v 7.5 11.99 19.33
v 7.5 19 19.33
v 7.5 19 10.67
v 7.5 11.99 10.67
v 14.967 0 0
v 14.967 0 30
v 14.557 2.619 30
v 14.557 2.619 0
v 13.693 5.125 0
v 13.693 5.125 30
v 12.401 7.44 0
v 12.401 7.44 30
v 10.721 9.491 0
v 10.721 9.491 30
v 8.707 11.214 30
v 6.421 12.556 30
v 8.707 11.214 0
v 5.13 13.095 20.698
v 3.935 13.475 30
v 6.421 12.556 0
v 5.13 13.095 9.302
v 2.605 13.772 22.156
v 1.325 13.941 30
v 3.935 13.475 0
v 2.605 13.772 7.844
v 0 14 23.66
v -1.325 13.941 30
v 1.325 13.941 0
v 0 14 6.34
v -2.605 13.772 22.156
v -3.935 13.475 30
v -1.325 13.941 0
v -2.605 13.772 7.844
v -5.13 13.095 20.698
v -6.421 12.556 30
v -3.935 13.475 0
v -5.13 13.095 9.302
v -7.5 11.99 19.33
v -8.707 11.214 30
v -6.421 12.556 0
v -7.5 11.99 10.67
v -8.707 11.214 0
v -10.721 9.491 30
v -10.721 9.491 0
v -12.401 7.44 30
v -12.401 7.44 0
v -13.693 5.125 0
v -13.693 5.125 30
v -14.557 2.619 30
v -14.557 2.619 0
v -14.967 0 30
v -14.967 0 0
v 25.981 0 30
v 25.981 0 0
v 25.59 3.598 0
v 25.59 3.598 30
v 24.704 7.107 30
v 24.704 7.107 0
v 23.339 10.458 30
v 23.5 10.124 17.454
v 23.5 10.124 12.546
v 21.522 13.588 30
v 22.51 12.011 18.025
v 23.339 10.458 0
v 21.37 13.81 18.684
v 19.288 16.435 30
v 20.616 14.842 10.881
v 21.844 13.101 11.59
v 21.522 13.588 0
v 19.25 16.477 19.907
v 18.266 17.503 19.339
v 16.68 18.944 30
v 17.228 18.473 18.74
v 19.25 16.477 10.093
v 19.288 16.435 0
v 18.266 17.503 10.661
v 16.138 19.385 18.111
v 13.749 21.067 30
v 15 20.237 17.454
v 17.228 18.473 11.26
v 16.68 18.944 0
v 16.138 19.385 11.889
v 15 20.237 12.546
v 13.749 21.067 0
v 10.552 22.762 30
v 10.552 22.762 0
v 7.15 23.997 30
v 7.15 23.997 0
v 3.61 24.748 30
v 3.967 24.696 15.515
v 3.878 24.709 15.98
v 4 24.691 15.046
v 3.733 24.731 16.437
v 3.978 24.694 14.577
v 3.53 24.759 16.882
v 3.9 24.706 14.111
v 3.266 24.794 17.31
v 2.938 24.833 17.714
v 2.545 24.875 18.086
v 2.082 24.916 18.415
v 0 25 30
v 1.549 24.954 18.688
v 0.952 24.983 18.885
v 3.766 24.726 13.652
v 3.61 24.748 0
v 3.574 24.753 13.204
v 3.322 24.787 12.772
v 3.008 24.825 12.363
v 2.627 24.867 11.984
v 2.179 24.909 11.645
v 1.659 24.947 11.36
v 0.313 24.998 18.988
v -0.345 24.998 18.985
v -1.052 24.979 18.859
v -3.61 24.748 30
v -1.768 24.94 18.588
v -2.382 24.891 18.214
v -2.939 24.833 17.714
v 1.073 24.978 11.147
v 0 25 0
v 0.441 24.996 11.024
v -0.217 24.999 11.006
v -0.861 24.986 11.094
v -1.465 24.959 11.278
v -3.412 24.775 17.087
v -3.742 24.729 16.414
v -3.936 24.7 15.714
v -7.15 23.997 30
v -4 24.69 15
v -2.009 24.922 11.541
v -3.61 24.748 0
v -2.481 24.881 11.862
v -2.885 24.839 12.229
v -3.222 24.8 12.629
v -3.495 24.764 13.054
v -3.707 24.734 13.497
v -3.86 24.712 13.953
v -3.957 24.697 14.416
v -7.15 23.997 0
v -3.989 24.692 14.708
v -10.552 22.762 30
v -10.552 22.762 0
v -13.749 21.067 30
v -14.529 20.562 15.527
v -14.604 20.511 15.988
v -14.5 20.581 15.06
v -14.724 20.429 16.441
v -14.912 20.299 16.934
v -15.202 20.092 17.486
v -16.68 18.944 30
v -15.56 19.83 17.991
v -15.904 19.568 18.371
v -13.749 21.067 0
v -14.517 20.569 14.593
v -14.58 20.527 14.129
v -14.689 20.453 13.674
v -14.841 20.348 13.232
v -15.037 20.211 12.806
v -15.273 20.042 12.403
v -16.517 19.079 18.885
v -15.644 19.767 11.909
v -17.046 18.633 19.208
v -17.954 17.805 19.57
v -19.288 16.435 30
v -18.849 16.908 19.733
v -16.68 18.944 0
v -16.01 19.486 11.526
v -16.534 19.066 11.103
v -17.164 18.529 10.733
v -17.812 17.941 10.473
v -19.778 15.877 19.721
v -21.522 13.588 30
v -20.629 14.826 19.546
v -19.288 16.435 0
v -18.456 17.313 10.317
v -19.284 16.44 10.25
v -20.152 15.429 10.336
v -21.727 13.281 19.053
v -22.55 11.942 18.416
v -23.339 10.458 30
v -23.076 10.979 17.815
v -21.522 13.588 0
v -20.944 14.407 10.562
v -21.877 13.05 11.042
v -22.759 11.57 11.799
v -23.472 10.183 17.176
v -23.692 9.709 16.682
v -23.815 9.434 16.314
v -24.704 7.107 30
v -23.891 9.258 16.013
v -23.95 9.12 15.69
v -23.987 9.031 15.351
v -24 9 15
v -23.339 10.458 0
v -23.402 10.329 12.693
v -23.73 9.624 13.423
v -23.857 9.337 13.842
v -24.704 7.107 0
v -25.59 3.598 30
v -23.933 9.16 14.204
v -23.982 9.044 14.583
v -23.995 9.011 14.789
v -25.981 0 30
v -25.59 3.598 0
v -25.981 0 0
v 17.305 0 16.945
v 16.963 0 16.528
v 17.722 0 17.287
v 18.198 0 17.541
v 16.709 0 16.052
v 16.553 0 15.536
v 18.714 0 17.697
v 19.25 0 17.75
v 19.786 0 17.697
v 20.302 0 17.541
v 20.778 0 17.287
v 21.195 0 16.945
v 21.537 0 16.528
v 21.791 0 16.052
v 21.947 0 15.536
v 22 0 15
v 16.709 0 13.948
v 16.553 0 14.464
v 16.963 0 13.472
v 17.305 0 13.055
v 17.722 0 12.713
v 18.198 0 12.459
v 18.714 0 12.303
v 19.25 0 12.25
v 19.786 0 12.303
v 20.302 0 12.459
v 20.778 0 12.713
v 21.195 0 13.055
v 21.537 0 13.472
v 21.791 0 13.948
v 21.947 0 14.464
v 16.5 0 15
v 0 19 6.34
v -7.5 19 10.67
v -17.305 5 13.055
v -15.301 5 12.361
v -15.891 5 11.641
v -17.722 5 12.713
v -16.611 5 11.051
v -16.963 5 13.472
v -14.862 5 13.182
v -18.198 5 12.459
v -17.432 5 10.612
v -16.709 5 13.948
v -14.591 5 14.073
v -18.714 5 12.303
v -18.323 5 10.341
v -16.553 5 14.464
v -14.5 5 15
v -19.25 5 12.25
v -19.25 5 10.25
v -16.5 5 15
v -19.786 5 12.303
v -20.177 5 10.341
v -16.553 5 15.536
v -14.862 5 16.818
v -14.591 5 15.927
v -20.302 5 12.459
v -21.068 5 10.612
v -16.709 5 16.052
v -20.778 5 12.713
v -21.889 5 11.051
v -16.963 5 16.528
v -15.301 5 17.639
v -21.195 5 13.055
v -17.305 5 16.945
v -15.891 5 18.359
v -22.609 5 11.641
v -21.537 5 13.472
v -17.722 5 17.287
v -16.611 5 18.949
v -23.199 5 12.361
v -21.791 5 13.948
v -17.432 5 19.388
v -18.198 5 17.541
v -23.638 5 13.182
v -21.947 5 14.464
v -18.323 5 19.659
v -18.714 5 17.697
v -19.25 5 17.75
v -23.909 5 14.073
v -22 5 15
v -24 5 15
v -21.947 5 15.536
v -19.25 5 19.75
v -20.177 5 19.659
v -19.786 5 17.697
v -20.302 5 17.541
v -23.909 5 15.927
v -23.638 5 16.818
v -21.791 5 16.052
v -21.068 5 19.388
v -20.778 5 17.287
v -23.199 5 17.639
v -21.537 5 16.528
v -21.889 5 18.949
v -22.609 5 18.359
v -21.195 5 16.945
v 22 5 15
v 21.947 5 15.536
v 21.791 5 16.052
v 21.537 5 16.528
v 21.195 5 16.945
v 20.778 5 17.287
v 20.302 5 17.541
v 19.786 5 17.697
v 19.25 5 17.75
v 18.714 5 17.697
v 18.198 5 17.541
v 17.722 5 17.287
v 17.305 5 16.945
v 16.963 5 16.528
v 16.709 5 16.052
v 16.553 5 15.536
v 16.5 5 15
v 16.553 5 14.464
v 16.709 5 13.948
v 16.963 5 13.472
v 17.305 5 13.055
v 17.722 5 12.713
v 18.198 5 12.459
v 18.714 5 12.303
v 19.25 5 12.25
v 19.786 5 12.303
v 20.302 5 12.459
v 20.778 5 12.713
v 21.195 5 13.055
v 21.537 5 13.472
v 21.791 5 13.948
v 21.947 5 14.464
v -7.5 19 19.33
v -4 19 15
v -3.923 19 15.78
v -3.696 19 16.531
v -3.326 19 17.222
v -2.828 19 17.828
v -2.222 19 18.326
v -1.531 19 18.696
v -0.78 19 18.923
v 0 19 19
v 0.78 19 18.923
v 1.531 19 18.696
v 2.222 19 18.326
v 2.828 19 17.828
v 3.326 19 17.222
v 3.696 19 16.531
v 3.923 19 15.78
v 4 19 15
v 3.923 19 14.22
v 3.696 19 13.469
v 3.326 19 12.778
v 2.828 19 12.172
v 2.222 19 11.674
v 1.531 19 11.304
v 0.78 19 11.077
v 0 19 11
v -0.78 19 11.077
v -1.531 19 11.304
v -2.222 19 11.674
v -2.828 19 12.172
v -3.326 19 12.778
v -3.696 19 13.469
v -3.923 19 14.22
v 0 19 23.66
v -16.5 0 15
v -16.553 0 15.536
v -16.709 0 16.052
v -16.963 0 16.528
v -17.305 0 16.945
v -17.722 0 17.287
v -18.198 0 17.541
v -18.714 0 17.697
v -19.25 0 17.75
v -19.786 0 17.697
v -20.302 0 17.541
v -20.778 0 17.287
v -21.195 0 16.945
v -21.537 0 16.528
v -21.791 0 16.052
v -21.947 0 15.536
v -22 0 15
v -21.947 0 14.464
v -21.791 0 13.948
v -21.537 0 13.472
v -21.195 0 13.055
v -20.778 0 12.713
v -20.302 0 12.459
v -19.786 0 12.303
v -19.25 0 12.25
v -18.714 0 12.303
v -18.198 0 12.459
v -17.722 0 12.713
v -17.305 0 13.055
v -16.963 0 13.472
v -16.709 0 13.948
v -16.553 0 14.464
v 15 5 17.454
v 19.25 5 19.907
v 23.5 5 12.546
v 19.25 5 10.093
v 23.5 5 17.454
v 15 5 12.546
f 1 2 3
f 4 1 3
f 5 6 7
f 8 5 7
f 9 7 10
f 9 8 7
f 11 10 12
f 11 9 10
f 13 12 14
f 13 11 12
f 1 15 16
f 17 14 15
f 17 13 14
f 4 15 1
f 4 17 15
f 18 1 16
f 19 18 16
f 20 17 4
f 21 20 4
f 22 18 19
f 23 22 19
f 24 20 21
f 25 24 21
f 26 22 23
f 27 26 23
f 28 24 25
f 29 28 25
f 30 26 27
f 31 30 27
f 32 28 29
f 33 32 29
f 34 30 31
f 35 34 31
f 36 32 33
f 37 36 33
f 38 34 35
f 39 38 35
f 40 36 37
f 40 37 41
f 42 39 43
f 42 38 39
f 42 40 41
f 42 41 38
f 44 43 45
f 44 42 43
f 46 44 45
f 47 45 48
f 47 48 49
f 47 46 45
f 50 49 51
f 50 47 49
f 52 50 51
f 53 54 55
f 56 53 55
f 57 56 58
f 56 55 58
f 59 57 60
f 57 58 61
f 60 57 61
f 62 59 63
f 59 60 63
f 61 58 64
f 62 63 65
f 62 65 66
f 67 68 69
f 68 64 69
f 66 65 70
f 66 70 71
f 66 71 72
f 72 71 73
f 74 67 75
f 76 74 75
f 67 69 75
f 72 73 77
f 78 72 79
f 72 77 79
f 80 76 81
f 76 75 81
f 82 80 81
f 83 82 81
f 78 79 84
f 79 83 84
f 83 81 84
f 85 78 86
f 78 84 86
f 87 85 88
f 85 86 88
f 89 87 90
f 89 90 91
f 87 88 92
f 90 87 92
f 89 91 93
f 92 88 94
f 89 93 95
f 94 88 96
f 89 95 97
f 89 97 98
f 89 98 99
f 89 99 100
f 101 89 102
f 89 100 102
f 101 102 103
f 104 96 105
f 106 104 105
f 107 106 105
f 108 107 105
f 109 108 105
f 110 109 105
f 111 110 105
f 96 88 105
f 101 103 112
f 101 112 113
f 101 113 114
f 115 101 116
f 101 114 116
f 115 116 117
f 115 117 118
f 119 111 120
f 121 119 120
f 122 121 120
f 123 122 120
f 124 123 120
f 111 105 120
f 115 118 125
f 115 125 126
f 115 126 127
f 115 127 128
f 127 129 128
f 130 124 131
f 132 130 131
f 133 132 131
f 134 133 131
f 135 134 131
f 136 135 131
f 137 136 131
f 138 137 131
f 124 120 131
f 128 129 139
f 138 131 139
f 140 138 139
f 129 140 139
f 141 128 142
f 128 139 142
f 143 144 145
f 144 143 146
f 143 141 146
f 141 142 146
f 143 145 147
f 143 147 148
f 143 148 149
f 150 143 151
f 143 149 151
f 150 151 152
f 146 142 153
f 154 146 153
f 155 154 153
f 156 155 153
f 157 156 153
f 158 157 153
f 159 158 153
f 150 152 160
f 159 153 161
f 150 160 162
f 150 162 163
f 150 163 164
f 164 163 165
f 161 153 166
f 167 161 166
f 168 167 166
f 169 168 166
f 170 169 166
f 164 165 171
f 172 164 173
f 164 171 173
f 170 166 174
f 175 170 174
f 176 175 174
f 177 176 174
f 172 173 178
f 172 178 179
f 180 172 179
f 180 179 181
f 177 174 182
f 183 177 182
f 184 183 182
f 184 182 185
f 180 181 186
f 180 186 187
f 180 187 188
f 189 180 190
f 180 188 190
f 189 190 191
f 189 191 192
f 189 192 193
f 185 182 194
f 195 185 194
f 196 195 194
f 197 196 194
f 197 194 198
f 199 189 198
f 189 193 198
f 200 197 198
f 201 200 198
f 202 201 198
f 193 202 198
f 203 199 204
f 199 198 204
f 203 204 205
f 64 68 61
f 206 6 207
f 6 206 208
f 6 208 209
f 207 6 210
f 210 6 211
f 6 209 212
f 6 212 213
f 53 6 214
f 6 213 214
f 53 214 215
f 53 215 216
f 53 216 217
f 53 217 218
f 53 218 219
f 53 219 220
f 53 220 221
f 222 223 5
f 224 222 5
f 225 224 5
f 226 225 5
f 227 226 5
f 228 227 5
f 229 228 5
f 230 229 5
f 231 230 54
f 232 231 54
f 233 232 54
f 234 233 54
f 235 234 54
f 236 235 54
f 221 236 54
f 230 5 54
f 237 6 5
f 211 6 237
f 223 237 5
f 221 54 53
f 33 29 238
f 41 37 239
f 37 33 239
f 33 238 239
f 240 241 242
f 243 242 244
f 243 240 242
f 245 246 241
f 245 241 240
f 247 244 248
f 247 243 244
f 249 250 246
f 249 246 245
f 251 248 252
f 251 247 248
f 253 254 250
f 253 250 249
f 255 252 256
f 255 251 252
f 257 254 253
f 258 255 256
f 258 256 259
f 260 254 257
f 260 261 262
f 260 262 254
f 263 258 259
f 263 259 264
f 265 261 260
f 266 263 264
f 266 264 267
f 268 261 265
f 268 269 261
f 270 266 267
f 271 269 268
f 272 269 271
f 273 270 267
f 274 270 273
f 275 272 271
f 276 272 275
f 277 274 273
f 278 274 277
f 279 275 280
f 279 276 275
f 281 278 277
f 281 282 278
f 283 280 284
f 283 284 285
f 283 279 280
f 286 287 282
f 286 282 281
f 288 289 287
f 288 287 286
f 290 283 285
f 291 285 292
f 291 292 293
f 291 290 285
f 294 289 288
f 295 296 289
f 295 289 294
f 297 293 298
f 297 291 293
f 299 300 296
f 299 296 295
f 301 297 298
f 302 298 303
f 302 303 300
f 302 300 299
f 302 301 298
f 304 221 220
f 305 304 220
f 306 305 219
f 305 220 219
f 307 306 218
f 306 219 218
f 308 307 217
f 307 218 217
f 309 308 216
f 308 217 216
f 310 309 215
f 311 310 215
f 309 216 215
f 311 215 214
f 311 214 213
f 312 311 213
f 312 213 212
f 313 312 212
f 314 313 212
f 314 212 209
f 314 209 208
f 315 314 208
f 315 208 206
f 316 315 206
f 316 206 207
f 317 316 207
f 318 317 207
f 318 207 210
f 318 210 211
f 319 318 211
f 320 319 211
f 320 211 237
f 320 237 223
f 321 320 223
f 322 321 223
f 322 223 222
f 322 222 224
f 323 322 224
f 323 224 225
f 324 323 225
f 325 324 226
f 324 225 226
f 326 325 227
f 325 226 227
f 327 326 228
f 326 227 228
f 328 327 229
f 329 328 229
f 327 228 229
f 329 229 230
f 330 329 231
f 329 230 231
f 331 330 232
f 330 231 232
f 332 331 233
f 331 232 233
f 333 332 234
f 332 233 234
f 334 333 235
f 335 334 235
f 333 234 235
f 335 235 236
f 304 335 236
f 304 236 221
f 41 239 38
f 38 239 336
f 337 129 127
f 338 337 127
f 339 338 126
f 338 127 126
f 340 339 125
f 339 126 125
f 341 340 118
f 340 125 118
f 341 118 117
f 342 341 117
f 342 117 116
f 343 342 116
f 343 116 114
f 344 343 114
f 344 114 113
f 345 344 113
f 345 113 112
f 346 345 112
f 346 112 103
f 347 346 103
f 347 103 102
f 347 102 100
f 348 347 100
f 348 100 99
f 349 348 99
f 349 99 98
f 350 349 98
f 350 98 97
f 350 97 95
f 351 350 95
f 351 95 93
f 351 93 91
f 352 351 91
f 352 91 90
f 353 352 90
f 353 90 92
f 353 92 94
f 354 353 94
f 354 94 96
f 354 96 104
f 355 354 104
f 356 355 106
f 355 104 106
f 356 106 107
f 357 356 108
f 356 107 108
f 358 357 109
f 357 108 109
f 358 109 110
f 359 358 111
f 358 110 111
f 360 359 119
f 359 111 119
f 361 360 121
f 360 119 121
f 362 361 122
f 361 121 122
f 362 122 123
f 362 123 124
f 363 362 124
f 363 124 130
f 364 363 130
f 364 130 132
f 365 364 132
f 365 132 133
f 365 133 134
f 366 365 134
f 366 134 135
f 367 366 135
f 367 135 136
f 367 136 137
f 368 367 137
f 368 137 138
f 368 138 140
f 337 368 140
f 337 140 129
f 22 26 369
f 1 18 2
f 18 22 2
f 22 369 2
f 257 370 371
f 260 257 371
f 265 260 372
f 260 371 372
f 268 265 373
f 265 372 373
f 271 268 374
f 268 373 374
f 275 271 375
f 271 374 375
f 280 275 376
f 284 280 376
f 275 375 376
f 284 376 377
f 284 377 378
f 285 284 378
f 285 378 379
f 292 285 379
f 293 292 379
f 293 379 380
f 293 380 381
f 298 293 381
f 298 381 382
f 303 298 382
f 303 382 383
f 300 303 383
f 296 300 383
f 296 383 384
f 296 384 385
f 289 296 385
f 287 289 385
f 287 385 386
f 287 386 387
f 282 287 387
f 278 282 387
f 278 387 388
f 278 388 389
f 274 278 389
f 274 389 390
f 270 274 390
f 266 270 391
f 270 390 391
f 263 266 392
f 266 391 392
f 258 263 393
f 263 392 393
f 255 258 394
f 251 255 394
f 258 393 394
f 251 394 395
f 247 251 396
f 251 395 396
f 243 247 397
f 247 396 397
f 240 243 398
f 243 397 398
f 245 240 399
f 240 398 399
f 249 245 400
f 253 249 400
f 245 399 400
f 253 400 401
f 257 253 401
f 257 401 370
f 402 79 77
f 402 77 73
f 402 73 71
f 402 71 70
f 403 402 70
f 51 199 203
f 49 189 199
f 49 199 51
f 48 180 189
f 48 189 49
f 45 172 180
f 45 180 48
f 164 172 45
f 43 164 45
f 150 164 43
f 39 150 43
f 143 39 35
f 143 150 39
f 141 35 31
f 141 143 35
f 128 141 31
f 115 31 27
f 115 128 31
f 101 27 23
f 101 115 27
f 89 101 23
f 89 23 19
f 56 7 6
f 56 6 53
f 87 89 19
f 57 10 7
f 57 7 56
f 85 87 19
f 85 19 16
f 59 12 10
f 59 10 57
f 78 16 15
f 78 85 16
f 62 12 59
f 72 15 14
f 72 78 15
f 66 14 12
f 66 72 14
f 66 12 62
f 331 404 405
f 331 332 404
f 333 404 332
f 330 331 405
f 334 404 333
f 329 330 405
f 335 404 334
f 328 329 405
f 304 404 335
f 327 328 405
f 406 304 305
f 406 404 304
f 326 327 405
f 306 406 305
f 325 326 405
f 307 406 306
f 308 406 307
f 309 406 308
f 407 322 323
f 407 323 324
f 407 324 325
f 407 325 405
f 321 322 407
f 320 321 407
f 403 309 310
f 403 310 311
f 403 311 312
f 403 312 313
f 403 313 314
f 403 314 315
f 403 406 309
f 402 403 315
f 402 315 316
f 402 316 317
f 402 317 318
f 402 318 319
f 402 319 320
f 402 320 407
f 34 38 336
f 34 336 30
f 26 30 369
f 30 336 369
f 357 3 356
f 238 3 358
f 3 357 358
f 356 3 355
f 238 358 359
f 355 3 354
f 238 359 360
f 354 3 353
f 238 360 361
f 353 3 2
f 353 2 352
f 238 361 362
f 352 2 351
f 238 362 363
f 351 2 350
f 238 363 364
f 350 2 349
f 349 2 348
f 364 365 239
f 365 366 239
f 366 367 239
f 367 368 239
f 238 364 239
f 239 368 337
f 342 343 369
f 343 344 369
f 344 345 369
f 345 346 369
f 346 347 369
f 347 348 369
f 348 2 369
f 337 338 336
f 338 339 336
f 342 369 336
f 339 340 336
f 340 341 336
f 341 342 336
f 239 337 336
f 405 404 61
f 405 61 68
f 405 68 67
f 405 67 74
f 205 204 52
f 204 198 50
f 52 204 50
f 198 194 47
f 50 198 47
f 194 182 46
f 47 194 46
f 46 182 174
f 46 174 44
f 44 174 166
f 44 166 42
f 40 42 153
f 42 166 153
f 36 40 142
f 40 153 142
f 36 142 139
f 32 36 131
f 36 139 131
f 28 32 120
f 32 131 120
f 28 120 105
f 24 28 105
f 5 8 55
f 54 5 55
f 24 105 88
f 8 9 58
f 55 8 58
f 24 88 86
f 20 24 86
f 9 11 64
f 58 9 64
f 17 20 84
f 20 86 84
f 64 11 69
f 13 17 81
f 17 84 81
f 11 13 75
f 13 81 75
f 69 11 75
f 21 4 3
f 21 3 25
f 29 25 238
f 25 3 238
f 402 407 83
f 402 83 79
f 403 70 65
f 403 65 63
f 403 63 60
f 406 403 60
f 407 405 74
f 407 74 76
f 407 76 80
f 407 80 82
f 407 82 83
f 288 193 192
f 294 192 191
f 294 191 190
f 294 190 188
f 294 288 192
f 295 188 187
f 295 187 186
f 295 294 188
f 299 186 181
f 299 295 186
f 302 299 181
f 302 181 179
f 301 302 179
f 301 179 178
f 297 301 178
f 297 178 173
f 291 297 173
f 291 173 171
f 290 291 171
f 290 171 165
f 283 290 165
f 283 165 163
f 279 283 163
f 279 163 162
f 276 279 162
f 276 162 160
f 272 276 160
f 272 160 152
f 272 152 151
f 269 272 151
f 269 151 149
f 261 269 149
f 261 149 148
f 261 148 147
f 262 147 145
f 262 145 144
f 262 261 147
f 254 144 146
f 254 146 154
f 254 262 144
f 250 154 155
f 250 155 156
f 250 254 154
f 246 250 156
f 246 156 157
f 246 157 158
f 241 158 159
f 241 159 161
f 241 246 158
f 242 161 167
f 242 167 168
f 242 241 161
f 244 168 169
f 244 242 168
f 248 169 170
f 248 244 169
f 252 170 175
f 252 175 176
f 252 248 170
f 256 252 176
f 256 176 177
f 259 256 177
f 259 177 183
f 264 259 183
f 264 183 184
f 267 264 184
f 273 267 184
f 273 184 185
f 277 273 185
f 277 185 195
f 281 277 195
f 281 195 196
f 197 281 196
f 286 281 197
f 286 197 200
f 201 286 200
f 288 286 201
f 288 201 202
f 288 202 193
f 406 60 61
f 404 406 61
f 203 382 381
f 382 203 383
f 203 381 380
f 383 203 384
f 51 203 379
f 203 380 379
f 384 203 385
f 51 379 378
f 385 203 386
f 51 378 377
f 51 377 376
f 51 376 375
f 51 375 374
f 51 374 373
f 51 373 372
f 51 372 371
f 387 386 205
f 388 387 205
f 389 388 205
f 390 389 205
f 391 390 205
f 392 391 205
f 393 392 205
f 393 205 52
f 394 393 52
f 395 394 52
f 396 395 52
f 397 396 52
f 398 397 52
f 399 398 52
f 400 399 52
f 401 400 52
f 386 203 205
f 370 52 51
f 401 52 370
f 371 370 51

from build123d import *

# Parameters (mm, degrees)
PAD_DEPTH       = 30
SKETCH001_R     = 4
POCKET_DEPTH    = 26.001
POCKET001_DEPTH = 19.001
SKETCH003_R     = 2.75
POCKET002_DEPTH = 25.001
SKETCH004_R     = 4.75
POCKET003_DEPTH = 20.001


with BuildPart() as part:
    # Sketch → Pad (new body)
    with BuildSketch(Plane.XY):
        with BuildLine():
            Line((-25.980762, 0), (-14.96663, 0))
            ThreePointArc((14.96663, 0), (0, 14), (-14.96663, 0))
            Line((14.96663, 0), (25.980762, 0))
            ThreePointArc((25.980762, 0), (0, 25), (-25.980762, 0))
        make_face()
    extrude(amount=PAD_DEPTH)

    # Sketch001 (on DatumPlane) → Pocket (cut, through all)
    with BuildSketch(Plane(origin=(0, 26, 0), x_dir=(-1, 0, 0), z_dir=(0, 1, 0))):
        with Locations((0, 15)):
            Circle(SKETCH001_R)
    extrude(amount=-POCKET_DEPTH, mode=Mode.SUBTRACT)

    # Sketch002 (on DatumPlane) → Pocket001 (cut, through all)
    with BuildSketch(Plane(origin=(0, 19, 0), x_dir=(-1, 0, 0), z_dir=(0, 1, 0))):
        Polygon((0, 23.660254), (-7.5, 19.330127), (-7.5, 10.669873), (0, 6.339746), (7.5, 10.669873), (7.5, 19.330127), align=None)
    extrude(amount=-POCKET001_DEPTH, mode=Mode.SUBTRACT)

    # Sketch003 (on DatumPlane) → Pocket002 (cut, through all)
    with BuildSketch(Plane.XZ):
        with Locations((19.25, 15)):
            Circle(SKETCH003_R)
        with Locations((-19.25, 15)):
            Circle(SKETCH003_R)
    extrude(amount=-POCKET002_DEPTH, mode=Mode.SUBTRACT)

    # Sketch004 (on DatumPlane) → Pocket003 (cut, through all)
    with BuildSketch(Plane(origin=(0, 5, 0), x_dir=(-1, 0, 0), z_dir=(0, 1, 0))):
        with Locations((19.25, 15)):
            Circle(SKETCH004_R)
        Polygon((-19.25, 19.907477), (-23.5, 17.453739), (-23.5, 12.546261), (-19.25, 10.092523), (-15, 12.546261), (-15, 17.453739), align=None)
    extrude(amount=POCKET003_DEPTH, mode=Mode.SUBTRACT)


solid = part.part
